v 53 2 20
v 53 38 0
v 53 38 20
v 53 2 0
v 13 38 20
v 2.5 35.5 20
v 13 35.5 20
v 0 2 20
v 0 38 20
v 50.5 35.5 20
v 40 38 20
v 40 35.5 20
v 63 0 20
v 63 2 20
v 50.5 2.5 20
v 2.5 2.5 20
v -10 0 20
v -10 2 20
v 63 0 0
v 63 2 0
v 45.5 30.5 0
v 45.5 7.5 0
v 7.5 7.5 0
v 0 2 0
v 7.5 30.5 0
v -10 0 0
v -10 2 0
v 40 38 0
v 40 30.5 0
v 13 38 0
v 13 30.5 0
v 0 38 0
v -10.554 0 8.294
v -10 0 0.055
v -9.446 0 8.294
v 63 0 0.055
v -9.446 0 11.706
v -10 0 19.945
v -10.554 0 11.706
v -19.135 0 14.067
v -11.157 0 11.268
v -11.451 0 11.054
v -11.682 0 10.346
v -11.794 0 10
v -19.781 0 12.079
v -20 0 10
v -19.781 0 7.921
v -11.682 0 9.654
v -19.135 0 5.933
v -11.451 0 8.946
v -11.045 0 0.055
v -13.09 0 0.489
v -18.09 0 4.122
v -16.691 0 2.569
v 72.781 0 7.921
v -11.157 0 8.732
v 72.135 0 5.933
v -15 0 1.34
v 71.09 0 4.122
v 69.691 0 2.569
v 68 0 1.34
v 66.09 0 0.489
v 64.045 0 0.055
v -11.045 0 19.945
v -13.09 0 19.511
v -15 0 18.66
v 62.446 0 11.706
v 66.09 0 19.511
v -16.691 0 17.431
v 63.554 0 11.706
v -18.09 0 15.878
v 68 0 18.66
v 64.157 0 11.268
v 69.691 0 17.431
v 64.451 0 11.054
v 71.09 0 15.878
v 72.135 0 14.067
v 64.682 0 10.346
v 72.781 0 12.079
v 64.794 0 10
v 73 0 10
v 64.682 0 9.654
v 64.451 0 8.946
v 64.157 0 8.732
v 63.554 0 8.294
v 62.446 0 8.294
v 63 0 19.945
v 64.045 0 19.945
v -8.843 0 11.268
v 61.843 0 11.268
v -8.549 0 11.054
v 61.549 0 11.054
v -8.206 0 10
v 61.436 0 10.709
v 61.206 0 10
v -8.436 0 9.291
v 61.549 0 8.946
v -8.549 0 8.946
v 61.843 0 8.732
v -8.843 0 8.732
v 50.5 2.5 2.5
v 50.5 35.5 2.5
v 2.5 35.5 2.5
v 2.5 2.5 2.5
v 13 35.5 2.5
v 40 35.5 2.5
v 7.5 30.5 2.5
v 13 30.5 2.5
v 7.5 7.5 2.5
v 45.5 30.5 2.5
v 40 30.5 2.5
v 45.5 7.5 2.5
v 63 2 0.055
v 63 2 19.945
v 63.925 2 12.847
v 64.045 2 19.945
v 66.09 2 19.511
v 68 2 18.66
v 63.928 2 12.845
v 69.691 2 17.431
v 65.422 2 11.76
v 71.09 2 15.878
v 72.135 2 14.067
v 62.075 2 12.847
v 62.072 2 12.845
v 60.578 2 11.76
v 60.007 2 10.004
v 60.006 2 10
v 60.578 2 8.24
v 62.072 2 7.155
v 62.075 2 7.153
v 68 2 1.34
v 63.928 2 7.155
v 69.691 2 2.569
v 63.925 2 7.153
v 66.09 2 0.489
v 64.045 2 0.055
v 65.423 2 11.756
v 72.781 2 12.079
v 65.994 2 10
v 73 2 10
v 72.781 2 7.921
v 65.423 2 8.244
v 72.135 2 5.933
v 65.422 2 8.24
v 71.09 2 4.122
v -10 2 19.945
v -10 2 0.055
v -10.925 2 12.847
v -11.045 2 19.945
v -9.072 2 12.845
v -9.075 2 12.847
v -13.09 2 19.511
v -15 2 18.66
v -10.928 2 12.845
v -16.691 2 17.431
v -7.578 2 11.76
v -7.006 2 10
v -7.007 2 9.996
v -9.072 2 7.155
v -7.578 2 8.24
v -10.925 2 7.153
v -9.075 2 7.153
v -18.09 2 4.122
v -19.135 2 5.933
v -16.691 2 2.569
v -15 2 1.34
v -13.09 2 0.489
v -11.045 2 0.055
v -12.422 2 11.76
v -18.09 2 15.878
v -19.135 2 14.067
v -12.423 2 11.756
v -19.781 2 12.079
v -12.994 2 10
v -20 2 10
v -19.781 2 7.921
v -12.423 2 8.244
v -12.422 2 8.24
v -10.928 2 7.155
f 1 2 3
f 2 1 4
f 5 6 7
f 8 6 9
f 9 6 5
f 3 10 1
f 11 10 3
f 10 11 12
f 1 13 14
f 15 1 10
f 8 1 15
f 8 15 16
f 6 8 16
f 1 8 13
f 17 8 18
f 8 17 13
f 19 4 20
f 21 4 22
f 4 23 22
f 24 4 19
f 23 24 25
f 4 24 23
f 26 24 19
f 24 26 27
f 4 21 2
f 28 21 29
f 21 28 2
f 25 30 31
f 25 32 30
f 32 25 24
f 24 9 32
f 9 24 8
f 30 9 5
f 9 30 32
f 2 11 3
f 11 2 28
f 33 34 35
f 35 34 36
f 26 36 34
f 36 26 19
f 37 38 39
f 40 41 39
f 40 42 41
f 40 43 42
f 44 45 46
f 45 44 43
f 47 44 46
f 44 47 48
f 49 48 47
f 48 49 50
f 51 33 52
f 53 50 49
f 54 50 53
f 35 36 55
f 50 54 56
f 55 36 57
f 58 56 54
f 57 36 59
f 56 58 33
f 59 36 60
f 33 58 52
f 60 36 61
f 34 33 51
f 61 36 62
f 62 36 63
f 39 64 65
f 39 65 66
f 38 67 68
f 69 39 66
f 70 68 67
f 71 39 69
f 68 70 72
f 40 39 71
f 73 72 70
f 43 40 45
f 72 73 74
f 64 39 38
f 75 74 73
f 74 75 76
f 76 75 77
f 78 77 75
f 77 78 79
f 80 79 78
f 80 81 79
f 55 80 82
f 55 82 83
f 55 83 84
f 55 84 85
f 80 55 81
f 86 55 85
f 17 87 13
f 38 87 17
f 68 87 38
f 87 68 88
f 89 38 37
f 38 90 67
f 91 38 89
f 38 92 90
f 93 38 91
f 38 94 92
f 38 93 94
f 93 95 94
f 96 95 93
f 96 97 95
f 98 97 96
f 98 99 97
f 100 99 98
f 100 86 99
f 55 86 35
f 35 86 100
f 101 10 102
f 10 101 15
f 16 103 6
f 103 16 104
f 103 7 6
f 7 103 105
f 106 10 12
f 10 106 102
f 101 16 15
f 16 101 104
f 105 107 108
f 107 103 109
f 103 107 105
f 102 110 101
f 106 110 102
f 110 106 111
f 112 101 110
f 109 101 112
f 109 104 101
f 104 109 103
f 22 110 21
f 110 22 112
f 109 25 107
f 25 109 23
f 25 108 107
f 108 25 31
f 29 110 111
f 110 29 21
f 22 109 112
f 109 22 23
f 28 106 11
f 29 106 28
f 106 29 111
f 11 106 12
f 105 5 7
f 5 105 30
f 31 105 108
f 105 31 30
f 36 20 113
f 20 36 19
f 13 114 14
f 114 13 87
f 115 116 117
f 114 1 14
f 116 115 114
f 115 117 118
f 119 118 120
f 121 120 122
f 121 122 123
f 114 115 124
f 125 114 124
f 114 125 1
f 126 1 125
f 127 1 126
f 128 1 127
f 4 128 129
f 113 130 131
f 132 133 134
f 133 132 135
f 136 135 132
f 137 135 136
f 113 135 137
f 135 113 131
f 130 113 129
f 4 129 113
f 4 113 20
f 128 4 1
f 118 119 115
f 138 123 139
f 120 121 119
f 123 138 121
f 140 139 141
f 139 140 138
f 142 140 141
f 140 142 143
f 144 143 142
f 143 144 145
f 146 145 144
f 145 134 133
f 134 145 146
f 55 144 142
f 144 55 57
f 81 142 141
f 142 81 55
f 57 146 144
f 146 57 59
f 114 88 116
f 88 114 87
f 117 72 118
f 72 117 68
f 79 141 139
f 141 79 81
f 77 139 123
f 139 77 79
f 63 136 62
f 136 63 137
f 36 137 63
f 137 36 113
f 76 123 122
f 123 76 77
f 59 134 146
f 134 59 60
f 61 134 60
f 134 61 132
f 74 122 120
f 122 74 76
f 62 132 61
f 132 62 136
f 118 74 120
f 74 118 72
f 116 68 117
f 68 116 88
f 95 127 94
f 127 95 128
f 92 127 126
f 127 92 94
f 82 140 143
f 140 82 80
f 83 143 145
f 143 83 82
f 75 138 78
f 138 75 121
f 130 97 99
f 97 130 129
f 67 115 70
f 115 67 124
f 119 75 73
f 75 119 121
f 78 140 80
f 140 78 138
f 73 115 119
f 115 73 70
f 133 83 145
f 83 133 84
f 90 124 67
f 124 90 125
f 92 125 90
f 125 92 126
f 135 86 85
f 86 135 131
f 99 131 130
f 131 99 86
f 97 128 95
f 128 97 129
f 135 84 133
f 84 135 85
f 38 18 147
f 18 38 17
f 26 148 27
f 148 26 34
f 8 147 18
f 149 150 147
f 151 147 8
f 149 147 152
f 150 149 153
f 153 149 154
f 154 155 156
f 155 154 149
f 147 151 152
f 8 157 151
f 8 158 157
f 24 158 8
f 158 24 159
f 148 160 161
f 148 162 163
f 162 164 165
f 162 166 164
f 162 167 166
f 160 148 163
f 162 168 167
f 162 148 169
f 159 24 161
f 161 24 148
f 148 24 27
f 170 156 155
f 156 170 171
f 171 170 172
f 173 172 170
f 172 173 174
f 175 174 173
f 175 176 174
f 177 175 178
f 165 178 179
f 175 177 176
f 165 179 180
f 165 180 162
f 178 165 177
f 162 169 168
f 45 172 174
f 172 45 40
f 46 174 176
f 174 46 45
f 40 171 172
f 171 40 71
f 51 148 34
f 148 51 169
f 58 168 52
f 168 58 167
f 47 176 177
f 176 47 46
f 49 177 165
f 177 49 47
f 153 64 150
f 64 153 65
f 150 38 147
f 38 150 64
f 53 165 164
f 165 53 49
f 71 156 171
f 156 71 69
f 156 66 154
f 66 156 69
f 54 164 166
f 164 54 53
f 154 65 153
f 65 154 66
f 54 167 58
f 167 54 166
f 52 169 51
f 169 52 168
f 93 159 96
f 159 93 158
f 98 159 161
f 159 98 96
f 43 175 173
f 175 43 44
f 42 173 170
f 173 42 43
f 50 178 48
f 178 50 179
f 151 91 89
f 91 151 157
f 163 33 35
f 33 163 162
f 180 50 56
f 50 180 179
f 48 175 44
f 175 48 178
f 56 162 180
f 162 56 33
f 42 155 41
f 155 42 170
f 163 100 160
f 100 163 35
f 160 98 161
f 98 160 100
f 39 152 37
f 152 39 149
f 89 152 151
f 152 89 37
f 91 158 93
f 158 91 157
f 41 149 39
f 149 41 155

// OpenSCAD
// file: cord_org.scad
module rim(inner_cube, thickness=2){
  //cube([48, 33, 15]);
  difference(){
      cube(inner_cube + [thickness * 2, thickness * 2, 0]);
      translate([thickness, thickness, -0.5 * thickness]) cube(inner_cube + [0, 0, thickness]);
      }
}

module screw_tab(x, y, z){
   block_x = x - y / 2;  // because round end extends by radius
   
   cube([block_x, y, z]);
   translate([block_x, y/2, 0]) cylinder(r = y / 2, h=z);
}


module screw(r1, r2, h, h_head){
    shaft_h = h - h_head;

    if (shaft_h > 0){
        cylinder(r=r2, h=shaft_h);
    }else{
        h_head = h;
    }
    translate([0, 0, shaft_h]) cylinder(r1=r2, r2=r1, h=h_head);
}

module one_screw_tab(x, y, z, h_head=2.5, r1=3, r2=1.5){
    difference(){
        screw_tab(x, y, z);
        translate([x - y/2, y / 2, -0.01]) screw(r1, r2, z + 0.02, h_head);
    }
}
// main file
include<cord_org.scad>


x_in = 48;
thickness = 2.5;
x_out = x_in + thickness * 2;
x_slot = 27;
z = 20;
height = 33;
bottom = 5;

difference(){
    union(){
        rim([x_in, height, z], thickness);
        // bottom piece only
        rim([x_in - bottom * 2, height - bottom * 2, thickness], thickness + bottom);
    }
    translate([x_in / 2 - x_slot / 2 + thickness, bottom + thickness, -0.5]){
        cube([x_slot, height + 7, z + 1]);
    }
}

translate([x_out, 0, 20]){
    rotate([-90, 0, 0]) one_screw_tab(20, z, 2);
}

rotate([90, 0, 180]) one_screw_tab(20, z, 2);
